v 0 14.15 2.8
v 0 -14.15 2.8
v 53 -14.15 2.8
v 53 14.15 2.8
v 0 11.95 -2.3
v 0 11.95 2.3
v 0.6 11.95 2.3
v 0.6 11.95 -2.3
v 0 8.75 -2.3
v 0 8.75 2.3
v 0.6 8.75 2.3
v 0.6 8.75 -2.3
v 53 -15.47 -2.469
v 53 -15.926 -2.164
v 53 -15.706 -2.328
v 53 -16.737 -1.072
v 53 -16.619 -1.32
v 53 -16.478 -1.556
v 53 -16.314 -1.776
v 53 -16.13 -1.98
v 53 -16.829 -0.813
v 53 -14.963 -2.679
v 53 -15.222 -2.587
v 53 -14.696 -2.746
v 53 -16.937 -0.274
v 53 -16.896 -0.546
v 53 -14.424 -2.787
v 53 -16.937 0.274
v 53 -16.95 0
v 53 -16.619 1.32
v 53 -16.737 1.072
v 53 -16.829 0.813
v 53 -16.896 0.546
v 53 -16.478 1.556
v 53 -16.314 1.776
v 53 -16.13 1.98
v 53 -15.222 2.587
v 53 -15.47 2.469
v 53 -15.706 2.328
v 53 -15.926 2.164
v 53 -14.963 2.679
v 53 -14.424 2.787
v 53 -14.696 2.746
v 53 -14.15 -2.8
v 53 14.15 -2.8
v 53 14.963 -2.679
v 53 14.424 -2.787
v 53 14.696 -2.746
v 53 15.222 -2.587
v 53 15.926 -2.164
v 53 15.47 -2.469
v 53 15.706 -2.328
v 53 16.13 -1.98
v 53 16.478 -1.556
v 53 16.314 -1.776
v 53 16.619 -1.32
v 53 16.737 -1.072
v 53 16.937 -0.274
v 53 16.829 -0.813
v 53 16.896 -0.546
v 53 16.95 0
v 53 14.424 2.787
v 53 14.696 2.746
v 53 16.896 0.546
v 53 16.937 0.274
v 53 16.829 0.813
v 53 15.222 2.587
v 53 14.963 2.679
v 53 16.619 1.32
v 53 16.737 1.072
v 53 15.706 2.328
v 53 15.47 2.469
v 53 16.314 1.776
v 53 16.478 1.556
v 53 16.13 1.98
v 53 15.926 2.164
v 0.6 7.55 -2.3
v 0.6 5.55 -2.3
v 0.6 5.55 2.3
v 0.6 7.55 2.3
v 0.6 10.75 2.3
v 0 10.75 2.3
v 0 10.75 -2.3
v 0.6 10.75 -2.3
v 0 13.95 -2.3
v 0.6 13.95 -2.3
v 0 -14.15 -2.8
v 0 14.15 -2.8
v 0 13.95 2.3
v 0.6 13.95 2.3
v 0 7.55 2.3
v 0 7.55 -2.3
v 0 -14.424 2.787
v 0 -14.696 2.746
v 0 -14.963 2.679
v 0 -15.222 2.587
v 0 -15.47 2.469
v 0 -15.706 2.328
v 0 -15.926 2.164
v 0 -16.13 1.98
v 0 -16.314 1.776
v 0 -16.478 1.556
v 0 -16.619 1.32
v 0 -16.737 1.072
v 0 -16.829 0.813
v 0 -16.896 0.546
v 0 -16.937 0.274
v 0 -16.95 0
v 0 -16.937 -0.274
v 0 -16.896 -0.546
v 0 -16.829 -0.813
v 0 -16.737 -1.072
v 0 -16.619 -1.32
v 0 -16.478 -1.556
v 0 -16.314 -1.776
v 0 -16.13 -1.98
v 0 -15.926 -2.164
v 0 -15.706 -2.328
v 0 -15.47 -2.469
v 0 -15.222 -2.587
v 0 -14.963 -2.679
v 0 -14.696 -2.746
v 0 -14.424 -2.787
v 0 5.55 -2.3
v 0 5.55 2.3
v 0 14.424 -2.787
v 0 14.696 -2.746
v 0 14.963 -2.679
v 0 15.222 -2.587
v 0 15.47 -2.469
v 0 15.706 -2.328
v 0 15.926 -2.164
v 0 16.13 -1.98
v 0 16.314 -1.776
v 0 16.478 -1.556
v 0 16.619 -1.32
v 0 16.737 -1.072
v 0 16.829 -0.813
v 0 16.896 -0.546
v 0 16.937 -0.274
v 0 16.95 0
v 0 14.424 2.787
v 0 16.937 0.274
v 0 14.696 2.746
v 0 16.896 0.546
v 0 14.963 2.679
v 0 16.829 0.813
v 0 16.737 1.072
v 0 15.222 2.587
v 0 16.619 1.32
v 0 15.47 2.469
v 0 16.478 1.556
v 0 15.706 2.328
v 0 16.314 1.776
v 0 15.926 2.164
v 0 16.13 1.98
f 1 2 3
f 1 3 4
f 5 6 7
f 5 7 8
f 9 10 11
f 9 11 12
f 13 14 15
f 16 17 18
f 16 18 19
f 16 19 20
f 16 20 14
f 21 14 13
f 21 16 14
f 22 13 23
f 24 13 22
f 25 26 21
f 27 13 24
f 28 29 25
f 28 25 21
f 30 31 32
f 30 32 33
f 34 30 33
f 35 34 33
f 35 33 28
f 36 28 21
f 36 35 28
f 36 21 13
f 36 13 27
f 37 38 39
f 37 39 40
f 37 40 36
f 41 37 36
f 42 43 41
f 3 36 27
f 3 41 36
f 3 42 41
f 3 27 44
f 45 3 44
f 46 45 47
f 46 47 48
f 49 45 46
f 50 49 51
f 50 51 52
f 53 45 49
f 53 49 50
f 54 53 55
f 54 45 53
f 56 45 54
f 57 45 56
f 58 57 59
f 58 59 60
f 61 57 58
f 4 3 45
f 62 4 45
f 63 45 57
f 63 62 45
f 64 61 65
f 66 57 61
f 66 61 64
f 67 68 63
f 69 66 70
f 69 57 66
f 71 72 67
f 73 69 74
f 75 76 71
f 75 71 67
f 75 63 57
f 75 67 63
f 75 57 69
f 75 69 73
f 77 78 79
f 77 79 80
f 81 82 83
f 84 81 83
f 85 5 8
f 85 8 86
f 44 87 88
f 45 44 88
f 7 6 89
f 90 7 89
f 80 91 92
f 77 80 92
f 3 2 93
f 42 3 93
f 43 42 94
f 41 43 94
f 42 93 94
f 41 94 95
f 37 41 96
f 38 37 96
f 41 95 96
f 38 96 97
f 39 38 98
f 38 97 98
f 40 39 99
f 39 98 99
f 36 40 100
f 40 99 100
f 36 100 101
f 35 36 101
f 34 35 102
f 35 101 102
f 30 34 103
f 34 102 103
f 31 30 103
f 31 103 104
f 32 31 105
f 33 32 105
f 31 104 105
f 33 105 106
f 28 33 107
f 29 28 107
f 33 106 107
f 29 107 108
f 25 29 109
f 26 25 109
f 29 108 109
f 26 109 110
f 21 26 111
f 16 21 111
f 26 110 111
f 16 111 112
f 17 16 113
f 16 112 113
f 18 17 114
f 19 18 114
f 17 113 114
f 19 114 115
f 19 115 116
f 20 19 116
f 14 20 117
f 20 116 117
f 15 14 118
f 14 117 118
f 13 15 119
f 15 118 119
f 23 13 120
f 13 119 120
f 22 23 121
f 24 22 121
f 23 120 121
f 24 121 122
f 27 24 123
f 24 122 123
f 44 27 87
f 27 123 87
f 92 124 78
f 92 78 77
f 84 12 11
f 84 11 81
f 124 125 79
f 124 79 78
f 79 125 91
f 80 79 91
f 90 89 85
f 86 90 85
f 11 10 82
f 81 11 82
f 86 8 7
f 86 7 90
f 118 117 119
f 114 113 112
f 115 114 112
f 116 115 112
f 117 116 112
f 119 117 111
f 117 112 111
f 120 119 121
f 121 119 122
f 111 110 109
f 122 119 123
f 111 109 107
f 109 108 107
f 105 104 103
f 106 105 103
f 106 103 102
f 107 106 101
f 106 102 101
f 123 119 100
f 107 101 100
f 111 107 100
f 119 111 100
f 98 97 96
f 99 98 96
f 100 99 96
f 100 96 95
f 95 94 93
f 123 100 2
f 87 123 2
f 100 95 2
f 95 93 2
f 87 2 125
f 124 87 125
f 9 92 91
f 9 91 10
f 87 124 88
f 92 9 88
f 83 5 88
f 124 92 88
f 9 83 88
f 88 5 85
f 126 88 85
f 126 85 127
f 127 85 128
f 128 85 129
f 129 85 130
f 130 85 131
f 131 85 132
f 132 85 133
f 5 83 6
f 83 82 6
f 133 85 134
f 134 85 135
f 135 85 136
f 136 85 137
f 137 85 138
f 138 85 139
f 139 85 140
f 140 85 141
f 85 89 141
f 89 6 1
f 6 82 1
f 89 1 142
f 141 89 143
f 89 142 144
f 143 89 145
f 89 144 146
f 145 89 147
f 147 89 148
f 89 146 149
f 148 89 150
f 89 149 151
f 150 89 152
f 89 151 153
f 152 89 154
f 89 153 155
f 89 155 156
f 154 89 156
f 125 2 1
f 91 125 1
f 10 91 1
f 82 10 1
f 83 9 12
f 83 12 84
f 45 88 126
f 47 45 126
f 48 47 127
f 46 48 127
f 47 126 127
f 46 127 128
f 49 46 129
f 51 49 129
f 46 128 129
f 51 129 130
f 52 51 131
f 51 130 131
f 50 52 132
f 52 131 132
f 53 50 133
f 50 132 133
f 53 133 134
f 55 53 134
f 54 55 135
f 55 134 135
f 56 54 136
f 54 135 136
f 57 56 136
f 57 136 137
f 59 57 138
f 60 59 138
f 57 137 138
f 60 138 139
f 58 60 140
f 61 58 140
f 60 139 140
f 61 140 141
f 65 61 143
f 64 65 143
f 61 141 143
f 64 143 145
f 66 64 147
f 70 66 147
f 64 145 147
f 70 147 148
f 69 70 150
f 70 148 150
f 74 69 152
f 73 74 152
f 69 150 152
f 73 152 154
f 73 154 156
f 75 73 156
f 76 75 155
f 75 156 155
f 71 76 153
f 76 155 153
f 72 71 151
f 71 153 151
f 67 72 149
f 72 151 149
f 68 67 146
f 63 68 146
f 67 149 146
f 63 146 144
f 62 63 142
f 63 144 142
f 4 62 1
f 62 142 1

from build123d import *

# Parameters (mm, degrees)
PAD_DEPTH    = 53
SKETCH001_W  = 2
SKETCH001_H  = 4.6
POCKET_DEPTH = 0.6


with BuildPart() as part:
    # Sketch → Pad (new body)
    with BuildSketch(Plane.YZ):
        with BuildLine():
            ThreePointArc((-14.15, 2.8), (-16.95, 0), (-14.15, -2.8))
            Line((-14.15, -2.8), (14.15, -2.8))
            ThreePointArc((14.15, -2.8), (16.95, 0), (14.15, 2.8))
            Line((-14.15, 2.8), (14.15, 2.8))
        make_face()
    extrude(amount=PAD_DEPTH)

    # Sketch001 (on DatumPlane) → Pocket (cut)
    with BuildSketch(Plane(origin=(0, 0, 0), x_dir=(0, 1, 0), z_dir=(-1, 0, 0))):
        with Locations((12.95, 0)):
            Rectangle(SKETCH001_W, SKETCH001_H)
        with Locations((9.75, 0)):
            Rectangle(SKETCH001_W, SKETCH001_H)
        with Locations((6.55, 0)):
            Rectangle(SKETCH001_W, SKETCH001_H)
    extrude(amount=-POCKET_DEPTH, mode=Mode.SUBTRACT)


solid = part.part
